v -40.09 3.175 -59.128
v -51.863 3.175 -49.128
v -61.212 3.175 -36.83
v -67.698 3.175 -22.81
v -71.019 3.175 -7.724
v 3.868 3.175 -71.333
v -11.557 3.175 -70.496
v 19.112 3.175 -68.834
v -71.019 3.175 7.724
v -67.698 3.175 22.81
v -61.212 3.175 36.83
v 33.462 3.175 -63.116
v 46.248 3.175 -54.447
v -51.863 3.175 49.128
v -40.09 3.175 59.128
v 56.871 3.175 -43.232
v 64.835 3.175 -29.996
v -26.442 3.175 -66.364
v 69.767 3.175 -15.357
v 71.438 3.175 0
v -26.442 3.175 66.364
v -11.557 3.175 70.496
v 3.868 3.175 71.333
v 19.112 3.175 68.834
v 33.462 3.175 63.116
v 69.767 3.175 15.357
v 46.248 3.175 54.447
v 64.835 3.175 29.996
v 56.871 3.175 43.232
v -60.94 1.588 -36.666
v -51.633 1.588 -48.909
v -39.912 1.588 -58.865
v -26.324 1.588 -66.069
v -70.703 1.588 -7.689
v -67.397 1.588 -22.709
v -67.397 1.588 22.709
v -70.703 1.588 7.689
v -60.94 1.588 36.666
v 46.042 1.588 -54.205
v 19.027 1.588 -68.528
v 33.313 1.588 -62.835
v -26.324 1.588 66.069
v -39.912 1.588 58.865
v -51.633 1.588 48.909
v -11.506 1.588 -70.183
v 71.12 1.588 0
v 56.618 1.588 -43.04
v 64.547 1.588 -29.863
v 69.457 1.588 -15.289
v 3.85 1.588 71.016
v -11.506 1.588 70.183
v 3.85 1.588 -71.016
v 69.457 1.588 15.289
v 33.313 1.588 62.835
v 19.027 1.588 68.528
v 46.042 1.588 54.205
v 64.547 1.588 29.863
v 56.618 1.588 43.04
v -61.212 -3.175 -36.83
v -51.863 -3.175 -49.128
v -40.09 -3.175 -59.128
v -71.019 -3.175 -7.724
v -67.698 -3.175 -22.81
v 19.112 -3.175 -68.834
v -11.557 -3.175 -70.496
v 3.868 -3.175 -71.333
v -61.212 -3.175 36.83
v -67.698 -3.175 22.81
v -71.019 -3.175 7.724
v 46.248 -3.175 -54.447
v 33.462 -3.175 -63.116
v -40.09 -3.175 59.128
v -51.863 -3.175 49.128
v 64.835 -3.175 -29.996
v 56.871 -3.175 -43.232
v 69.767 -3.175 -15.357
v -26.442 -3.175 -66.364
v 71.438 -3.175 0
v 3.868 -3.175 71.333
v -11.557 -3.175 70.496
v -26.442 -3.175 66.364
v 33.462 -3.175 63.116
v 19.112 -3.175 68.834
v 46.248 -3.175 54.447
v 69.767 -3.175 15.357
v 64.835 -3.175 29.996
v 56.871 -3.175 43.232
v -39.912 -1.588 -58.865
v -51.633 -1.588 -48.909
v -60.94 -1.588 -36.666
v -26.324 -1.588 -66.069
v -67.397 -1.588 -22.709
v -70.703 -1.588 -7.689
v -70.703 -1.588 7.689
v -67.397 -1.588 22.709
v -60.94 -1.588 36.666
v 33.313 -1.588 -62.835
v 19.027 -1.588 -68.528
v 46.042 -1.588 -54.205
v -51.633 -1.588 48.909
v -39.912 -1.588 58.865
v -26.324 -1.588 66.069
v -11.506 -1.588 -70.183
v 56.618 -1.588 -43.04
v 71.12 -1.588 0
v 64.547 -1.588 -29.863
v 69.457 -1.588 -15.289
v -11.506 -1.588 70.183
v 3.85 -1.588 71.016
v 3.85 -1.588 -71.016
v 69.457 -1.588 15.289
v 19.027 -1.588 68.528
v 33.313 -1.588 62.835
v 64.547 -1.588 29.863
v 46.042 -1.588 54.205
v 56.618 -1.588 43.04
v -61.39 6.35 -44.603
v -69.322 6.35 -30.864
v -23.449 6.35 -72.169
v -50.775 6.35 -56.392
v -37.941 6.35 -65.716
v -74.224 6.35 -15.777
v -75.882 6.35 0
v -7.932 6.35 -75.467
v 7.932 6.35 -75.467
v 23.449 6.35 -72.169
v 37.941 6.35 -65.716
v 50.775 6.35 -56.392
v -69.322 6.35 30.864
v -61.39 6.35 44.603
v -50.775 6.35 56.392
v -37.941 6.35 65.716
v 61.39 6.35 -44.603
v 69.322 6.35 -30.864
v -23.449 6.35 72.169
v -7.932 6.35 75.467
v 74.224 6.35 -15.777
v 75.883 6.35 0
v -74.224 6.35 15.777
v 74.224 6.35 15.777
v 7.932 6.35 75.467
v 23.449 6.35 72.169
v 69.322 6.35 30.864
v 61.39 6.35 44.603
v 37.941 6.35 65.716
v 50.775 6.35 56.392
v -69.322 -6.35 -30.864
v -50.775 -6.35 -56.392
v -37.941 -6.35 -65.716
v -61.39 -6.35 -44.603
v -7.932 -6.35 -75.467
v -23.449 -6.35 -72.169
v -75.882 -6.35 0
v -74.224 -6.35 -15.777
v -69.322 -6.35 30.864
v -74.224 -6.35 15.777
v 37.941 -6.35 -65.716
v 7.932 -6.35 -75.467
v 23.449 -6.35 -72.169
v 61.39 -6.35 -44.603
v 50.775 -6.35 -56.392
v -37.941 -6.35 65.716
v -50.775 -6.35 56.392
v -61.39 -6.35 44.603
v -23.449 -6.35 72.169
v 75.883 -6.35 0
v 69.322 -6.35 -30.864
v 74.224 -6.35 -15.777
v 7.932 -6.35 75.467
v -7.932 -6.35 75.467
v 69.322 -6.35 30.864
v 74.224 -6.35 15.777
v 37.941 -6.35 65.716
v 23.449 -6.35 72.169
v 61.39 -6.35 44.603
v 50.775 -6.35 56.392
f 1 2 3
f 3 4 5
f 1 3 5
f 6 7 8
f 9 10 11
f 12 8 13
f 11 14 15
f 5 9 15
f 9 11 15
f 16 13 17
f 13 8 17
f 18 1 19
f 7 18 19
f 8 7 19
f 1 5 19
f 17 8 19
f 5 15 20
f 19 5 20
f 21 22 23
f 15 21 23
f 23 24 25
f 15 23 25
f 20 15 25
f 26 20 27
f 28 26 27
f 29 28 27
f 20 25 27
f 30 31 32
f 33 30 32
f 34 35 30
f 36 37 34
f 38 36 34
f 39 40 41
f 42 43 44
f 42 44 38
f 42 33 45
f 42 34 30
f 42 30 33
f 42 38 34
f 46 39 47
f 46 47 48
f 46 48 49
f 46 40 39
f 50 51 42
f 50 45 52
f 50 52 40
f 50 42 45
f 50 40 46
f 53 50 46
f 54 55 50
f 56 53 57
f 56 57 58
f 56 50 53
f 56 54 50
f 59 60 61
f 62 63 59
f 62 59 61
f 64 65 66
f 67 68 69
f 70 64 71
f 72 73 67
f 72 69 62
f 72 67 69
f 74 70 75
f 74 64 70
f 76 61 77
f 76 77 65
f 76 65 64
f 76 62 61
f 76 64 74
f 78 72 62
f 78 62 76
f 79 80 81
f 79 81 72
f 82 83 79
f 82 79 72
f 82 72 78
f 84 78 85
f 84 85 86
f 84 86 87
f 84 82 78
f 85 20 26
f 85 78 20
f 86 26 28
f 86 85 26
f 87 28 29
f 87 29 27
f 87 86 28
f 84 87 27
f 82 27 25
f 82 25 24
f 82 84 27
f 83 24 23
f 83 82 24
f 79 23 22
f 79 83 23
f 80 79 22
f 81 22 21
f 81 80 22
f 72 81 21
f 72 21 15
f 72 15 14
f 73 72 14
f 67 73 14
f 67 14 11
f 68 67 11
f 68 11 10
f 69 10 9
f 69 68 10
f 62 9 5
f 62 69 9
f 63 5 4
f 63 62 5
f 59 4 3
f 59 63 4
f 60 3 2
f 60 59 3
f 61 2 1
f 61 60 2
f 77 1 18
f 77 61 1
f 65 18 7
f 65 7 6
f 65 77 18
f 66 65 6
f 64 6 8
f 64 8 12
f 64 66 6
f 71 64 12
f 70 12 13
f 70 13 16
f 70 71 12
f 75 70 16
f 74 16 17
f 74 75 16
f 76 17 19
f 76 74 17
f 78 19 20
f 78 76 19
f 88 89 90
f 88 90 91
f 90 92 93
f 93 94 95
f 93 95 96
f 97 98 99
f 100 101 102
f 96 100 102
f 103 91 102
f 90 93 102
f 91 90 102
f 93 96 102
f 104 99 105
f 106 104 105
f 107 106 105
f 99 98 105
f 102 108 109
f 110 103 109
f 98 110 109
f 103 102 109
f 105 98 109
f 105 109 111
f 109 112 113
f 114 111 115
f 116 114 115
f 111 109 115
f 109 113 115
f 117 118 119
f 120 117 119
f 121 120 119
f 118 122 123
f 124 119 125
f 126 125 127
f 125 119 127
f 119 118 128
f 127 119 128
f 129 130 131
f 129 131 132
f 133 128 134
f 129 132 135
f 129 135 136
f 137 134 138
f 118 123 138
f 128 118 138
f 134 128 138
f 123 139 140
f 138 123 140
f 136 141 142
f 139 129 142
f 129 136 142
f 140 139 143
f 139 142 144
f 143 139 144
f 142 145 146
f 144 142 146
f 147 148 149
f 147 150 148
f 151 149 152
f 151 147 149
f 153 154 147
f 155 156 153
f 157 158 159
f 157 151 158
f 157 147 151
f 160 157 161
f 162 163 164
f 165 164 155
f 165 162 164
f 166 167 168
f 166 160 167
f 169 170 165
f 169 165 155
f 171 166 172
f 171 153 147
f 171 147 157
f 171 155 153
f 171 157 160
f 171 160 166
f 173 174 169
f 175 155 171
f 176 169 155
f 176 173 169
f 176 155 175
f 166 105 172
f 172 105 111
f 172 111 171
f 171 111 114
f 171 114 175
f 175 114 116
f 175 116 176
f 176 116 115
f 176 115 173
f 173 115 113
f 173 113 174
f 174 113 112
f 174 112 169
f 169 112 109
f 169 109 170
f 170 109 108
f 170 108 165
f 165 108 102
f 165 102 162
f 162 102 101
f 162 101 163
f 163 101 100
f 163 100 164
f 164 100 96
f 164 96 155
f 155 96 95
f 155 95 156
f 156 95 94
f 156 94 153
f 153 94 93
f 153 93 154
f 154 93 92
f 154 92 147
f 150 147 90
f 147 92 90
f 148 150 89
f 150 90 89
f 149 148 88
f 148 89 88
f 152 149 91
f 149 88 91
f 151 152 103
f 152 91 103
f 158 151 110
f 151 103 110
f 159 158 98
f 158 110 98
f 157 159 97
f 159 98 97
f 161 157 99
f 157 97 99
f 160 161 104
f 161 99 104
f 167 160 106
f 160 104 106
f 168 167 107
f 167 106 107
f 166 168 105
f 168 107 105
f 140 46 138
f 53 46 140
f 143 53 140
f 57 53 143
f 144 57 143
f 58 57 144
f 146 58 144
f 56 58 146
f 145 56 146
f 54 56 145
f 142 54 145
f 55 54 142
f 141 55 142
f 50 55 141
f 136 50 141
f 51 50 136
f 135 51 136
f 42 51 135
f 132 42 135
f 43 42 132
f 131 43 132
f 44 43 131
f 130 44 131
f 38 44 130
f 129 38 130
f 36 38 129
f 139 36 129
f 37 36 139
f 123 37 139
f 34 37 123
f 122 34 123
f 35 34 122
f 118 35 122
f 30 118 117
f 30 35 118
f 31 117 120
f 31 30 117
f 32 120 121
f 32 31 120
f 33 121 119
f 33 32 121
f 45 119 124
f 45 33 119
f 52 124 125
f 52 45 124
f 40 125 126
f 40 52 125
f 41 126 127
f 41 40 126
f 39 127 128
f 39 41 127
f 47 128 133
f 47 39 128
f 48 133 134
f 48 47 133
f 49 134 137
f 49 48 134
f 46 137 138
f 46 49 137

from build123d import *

# Parameters (mm, degrees)
F0_R     = 76.2
F1_DEPTH = 6.35
F2_R     = 76.2
F3_DEPTH = 1.5875
F4_R     = 71.4375
F5_DEPTH = 3.175


# Not quite as in the source:
# - a fillet or chamfer that OpenCascade refuses, or shapes differently, is made with other operations: its cross-section is extruded or revolved along the edge and cut away or added


with BuildPart() as f1:
    # F0 (on Front) → F1 (new body, symmetric)
    with BuildSketch(Plane.XZ):
        Circle(F0_R)
    extrude(amount=F1_DEPTH, both=True)

    # F2 (on Front) → F3 (cut, symmetric)
    with BuildSketch(Plane.XZ):
        Circle(F2_R)
    extrude(amount=F3_DEPTH, both=True, mode=Mode.SUBTRACT)

    # F6: chamfer of 5.08 on 1 edges, made by hand

    # F6_s1 → F6_t2 (revolve, cut)
    with BuildSketch(Plane.XY):
        Polygon((76.2, 6.6675), (71.12, 1.5875), (76.2, 1.5875), align=None)
    revolve(axis=Axis((0, 1.5875, 0), (0, -1, 0)), mode=Mode.SUBTRACT)

    # F6#s1: chamfer of 5.08 on 1 edges, made by hand

    # F6_s1_s1 → F6_s1_t2 (revolve, cut)
    with BuildSketch(Plane.XY):
        Polygon((76.2, -6.6675), (71.12, -1.5875), (76.2, -1.5875), align=None)
    revolve(axis=Axis((0, -1.5875, 0), (0, -1, 0)), mode=Mode.SUBTRACT)


with BuildPart() as f5:
    # F4 (on Front) → F5 (new body, symmetric)
    with BuildSketch(Plane.XZ):
        Circle(F4_R)
    extrude(amount=F5_DEPTH, both=True)


solid = Compound([f1.part, f5.part])
